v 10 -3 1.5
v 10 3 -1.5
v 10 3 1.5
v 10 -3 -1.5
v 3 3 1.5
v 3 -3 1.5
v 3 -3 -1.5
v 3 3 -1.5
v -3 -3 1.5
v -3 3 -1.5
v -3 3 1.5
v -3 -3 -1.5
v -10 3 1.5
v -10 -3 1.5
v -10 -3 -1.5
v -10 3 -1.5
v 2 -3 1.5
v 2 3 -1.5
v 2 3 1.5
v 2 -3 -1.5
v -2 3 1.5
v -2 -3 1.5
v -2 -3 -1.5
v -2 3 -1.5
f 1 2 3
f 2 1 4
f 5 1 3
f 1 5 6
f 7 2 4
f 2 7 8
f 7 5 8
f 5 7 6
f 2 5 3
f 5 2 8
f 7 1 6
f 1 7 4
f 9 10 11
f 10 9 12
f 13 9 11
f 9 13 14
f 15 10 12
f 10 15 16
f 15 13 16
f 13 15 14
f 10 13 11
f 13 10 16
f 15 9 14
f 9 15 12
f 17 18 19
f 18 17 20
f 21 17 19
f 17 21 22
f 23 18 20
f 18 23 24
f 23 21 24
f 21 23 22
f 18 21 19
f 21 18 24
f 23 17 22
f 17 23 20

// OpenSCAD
// file: config.scad
$fn = 50;
nothing = 0.01;

material_z = 3;

snap_joint_width = 20;
snap_joint_height = 40;
snap_joint_feather_width = 5;
snap_joint_feather_hook_width = 2;
snap_joint_feather_hook_height = 5;
snap_joint_feather_hook_cutaway = 3;
snap_joint_feather_base_height = 3;
snap_joint_stick_width = 4;
// main file
include <config.scad>;

module snap_nut_cutout(
            width = snap_joint_width,
            feather_width = snap_joint_feather_width,
            feather_hook_width = snap_joint_feather_hook_width,
            stick_width = snap_joint_stick_width
            )
{
    translate([
        width/2 - feather_width/2 - feather_hook_width/2,
        0,
        0
        ])
    cube([
        feather_width + feather_hook_width,
        material_z*2,
        material_z
        ], center=true);

    translate([
        -width/2 + feather_width/2 + feather_hook_width/2,
        0,
        0
        ])
    cube([
        feather_width + feather_hook_width,
        material_z*2,
        material_z
        ], center=true);

    cube([
        stick_width,
        material_z*2,
        material_z
        ], center=true);
}

snap_nut_cutout();
